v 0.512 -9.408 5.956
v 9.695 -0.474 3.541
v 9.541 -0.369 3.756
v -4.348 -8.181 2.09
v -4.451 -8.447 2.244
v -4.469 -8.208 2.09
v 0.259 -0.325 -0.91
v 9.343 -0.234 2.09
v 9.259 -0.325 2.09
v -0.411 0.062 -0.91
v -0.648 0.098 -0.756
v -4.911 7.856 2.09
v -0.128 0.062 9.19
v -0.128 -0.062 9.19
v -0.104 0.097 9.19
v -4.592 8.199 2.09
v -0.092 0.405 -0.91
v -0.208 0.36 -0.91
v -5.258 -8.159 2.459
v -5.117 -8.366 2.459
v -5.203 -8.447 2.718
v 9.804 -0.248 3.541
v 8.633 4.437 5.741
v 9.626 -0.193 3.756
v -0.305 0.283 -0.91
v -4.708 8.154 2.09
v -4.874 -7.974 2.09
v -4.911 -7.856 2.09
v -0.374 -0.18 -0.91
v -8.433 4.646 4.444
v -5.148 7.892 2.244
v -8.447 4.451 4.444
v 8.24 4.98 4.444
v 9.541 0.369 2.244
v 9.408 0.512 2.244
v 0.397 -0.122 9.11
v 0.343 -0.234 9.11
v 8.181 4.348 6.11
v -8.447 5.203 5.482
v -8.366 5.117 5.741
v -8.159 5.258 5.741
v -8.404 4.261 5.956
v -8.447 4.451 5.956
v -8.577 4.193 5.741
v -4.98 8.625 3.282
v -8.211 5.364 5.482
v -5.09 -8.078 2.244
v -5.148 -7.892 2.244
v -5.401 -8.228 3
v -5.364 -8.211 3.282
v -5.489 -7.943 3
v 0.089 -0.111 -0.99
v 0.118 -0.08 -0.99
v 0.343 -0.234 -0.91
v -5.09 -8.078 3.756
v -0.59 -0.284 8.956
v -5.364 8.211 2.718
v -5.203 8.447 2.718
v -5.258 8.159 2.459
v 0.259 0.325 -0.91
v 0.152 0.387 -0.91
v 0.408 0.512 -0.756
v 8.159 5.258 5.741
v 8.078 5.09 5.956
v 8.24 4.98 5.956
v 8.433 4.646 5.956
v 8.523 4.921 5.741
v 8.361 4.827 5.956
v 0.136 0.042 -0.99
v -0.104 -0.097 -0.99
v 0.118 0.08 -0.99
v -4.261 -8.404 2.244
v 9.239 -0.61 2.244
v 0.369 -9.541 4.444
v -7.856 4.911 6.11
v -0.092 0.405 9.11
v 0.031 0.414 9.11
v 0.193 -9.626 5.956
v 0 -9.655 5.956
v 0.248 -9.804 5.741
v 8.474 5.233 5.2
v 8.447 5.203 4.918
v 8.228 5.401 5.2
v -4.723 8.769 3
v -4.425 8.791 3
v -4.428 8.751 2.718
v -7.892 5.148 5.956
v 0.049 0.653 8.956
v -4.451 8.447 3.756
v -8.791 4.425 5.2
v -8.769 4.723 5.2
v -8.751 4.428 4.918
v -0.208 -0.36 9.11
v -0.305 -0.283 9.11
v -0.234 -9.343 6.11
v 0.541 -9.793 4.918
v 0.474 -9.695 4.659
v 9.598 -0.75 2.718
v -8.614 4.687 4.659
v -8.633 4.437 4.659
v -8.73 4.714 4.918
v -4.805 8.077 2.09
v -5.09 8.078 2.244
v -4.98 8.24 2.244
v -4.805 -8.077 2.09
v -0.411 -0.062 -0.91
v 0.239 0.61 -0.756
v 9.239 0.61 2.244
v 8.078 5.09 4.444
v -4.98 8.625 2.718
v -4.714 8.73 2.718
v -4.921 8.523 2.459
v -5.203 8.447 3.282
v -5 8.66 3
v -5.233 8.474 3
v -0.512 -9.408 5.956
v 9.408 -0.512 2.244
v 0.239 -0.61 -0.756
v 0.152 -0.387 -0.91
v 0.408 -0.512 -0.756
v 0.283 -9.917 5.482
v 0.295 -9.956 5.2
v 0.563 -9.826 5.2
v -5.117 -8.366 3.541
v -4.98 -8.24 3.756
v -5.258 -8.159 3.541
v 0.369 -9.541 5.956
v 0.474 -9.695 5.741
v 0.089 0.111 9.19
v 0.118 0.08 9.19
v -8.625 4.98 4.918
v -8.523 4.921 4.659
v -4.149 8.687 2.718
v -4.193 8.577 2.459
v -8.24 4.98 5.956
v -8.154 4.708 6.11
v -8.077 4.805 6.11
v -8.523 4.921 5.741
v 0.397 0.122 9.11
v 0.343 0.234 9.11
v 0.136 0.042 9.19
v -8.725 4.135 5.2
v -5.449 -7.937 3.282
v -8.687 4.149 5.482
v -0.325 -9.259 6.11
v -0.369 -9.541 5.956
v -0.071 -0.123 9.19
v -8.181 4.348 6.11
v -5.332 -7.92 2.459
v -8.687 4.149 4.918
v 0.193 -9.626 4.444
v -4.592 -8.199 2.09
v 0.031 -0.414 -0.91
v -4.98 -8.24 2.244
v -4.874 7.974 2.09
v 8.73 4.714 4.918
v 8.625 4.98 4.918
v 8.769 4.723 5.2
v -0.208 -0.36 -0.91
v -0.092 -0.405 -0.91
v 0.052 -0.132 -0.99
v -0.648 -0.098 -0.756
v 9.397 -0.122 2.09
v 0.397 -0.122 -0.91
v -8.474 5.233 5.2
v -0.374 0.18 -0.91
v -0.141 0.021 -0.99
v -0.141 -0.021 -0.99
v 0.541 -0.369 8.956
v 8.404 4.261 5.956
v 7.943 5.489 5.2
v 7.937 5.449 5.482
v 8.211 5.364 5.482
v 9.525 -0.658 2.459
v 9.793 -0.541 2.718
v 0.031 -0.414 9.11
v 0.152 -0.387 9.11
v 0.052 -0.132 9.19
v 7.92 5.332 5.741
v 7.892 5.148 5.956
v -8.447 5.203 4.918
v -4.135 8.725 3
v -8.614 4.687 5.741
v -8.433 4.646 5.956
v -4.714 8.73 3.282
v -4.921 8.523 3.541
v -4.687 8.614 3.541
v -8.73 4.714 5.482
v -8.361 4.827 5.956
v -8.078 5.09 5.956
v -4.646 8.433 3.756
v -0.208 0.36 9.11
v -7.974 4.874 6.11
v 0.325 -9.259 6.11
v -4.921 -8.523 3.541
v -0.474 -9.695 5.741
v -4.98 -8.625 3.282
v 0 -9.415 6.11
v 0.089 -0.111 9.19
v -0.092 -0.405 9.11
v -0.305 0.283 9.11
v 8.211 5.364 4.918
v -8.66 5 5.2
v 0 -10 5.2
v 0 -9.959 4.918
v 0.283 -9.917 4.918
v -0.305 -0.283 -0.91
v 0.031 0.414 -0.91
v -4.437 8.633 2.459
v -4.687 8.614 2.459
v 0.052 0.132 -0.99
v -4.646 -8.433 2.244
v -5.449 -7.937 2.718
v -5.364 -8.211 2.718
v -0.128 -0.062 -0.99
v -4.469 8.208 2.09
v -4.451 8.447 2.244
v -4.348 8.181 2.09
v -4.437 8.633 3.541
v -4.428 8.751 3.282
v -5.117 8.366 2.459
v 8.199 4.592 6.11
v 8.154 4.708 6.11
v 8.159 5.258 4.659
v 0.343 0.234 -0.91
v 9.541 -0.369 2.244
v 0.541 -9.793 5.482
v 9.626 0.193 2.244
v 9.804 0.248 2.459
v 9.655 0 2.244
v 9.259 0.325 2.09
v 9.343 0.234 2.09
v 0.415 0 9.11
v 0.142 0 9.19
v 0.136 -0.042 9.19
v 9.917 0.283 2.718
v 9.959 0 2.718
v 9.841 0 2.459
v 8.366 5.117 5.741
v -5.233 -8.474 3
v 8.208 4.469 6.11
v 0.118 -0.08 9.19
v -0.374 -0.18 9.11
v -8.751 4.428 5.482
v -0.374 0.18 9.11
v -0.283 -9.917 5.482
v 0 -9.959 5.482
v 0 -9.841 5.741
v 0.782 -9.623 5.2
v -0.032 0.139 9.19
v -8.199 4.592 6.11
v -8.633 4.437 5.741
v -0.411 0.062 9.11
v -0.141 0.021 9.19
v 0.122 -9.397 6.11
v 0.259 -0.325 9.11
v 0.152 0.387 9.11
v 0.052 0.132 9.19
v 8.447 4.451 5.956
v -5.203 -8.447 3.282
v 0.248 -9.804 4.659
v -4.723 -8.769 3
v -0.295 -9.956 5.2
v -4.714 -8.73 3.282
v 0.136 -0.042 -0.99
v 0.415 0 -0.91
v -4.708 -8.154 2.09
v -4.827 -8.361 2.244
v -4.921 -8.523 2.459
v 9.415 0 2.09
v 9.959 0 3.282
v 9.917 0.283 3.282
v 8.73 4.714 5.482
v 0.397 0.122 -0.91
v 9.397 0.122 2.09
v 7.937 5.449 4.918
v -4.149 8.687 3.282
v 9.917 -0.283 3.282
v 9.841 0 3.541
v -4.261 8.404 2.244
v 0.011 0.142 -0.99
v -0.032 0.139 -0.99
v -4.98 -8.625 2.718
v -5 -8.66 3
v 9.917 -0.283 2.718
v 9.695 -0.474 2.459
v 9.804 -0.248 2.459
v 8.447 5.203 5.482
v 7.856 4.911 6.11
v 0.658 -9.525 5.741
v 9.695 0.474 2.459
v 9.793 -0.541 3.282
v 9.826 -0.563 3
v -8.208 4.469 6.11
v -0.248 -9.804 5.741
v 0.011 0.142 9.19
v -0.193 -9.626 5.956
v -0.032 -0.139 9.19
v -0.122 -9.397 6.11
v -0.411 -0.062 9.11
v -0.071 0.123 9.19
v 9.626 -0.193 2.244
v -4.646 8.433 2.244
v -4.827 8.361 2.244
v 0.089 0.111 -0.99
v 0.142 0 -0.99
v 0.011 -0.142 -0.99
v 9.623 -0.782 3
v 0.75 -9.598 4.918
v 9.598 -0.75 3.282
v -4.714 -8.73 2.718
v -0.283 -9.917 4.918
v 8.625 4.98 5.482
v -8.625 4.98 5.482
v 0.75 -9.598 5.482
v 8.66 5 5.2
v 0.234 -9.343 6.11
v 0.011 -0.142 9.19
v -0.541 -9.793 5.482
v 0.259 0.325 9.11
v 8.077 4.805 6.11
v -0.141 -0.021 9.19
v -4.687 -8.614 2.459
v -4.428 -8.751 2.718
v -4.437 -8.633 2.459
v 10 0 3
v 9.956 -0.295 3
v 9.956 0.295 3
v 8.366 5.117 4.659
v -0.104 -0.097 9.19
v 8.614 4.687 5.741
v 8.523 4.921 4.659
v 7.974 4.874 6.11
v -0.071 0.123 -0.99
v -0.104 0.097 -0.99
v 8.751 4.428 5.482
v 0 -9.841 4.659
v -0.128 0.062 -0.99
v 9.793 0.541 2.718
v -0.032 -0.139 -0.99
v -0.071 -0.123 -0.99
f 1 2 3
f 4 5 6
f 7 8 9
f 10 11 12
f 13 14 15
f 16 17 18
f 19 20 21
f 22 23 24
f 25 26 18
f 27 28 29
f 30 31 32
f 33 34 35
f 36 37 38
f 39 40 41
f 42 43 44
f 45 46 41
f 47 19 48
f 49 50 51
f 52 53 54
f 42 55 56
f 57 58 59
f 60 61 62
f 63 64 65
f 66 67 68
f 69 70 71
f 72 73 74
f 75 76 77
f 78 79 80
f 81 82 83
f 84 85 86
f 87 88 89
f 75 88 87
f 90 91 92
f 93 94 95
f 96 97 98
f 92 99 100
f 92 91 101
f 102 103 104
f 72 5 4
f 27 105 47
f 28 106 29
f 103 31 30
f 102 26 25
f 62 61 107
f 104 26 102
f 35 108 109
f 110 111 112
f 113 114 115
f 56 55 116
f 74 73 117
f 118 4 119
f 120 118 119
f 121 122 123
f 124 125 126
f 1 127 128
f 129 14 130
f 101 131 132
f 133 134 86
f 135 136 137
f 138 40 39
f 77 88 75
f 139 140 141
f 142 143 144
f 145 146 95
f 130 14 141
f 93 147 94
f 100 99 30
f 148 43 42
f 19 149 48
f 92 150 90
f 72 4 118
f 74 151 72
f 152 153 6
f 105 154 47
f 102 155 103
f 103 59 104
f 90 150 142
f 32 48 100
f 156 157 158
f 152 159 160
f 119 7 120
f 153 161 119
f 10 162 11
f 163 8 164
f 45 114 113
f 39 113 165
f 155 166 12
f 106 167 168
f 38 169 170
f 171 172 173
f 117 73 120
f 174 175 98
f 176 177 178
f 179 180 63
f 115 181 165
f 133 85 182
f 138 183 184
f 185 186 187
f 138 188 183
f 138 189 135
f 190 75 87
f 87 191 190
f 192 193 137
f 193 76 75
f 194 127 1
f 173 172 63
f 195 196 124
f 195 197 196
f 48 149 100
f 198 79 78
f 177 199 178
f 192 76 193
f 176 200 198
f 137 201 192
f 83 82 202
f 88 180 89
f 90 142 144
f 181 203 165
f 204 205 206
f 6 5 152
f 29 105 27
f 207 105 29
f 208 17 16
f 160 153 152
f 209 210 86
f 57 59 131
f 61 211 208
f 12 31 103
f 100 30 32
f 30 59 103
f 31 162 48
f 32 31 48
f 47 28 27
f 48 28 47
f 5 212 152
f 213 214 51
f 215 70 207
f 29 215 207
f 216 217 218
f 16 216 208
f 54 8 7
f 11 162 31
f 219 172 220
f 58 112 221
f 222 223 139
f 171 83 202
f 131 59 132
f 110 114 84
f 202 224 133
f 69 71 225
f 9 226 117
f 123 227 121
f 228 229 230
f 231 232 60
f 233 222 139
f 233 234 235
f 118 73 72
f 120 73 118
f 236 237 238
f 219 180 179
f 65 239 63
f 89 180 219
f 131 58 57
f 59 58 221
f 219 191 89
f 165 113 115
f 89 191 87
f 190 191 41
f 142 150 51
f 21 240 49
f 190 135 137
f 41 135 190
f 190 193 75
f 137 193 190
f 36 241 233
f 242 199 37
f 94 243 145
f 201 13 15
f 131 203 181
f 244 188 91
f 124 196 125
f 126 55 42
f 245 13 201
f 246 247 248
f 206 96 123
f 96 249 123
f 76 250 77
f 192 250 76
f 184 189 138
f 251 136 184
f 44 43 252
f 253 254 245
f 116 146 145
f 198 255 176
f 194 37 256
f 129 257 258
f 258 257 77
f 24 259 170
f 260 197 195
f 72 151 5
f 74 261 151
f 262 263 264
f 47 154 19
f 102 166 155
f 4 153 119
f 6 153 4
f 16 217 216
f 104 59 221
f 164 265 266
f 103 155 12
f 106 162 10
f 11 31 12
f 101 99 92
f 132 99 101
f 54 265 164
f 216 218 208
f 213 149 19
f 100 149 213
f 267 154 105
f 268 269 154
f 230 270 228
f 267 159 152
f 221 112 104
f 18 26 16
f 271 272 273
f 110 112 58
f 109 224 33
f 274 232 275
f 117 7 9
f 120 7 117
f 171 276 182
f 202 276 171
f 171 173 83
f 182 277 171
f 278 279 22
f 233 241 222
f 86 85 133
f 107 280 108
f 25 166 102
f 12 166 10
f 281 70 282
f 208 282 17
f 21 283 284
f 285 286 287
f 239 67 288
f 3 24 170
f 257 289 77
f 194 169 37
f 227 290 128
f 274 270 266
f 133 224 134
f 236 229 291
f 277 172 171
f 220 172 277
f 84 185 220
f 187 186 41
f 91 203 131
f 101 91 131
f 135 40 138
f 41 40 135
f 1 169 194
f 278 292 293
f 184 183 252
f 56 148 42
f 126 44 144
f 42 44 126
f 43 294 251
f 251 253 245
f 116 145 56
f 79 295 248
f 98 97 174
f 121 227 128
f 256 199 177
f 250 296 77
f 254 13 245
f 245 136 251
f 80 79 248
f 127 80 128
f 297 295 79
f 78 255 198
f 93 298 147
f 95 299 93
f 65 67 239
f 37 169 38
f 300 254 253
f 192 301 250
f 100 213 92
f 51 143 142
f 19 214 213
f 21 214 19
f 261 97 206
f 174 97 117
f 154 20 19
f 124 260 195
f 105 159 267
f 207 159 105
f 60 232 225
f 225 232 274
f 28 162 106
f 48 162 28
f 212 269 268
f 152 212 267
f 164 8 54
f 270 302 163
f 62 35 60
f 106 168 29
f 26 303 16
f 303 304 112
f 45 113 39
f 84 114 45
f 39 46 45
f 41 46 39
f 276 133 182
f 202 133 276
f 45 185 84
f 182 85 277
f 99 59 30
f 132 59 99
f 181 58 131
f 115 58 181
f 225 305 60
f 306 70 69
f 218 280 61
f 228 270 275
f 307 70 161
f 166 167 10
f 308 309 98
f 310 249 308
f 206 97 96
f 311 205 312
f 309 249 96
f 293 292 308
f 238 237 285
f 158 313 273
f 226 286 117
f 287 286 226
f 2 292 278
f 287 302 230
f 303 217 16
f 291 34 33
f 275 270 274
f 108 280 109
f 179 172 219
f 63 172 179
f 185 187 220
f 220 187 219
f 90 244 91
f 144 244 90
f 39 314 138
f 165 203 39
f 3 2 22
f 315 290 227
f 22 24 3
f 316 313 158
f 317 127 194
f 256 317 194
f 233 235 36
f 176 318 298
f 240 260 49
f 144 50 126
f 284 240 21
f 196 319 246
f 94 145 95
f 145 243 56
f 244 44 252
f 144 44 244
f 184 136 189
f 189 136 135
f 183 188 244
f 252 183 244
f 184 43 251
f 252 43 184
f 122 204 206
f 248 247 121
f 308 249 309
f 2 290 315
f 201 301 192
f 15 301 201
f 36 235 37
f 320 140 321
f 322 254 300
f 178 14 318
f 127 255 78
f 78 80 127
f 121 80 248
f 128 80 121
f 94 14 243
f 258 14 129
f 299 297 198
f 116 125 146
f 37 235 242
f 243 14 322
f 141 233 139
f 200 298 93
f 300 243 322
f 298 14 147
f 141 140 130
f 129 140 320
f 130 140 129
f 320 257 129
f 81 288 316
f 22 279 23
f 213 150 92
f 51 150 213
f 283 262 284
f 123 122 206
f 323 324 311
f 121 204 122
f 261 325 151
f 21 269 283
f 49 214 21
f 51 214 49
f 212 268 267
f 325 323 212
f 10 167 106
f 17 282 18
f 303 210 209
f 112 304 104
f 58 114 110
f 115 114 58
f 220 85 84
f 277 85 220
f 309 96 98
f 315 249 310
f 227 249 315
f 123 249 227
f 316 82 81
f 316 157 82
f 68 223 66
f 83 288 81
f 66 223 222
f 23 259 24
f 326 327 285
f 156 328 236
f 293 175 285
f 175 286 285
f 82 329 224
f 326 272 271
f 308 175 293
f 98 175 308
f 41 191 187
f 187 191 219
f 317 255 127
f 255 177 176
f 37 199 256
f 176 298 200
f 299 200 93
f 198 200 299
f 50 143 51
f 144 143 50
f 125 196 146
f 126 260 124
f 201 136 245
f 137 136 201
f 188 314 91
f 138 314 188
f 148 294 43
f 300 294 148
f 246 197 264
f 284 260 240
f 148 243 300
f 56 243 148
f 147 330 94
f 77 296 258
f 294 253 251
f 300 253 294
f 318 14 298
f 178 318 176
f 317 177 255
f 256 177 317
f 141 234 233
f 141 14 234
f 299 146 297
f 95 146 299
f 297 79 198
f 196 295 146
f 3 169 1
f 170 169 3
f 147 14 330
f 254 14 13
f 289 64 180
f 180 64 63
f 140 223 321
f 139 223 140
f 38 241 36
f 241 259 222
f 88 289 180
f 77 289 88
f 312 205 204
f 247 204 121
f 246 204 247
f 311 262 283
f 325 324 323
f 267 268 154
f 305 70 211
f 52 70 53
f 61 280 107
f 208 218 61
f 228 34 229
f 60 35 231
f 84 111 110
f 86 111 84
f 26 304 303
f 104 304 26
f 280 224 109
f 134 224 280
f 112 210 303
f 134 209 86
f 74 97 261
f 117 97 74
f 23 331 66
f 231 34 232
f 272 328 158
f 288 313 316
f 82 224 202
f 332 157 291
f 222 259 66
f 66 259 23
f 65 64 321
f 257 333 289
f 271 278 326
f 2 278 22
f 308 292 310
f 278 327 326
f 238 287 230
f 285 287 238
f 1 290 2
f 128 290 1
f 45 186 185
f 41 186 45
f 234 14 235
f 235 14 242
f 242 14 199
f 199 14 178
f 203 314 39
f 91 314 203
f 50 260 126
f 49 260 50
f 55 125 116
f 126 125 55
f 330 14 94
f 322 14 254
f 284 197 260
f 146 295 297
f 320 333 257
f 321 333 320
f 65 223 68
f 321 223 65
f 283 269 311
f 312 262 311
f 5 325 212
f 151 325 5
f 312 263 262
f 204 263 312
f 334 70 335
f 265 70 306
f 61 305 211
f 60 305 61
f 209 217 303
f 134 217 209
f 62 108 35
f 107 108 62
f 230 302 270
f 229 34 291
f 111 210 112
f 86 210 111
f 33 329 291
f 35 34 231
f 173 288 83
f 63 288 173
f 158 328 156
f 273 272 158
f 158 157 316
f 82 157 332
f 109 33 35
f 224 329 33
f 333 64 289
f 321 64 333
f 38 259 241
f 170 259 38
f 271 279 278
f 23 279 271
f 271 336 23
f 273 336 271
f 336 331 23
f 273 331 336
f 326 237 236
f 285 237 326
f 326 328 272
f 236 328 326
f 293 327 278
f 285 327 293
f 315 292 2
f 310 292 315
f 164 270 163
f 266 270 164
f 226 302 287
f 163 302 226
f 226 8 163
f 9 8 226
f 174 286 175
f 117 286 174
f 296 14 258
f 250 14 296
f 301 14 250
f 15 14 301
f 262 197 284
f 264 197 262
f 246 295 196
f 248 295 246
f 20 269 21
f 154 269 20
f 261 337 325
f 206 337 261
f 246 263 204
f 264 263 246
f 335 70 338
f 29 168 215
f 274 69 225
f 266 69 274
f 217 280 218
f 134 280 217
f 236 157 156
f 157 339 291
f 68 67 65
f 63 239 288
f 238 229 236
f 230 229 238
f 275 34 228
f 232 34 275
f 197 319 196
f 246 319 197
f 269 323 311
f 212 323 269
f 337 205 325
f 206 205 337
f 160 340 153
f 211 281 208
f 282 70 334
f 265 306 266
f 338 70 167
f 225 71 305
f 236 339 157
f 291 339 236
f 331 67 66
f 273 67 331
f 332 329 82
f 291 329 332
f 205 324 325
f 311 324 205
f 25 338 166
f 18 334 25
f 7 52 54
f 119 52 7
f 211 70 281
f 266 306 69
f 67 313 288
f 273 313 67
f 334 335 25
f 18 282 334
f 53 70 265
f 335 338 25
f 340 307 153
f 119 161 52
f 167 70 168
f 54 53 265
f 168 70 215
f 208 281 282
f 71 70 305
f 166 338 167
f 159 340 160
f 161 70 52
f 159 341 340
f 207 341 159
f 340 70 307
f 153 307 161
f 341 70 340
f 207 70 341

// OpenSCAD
// Generated by SolidPython 0.4.6 on 2020-02-11 16:42:19
$fa = .01;
$fs = 0.3;


hull() {
	union() {
		translate(v = [0, 0, 0]) {
			sphere();
		}
		translate(v = [0, 0, 8.2000000000]) {
			sphere();
		}
		rotate(a = 0.0000000000, v = [0, 0, 1]) {
			translate(v = [9, 0, 3]) {
				sphere();
			}
		}
		rotate(a = 30.0000000000, v = [0, 0, 1]) {
			translate(v = [9, 0, 5.2000000000]) {
				sphere();
			}
		}
		rotate(a = 120.0000000000, v = [0, 0, 1]) {
			translate(v = [9, 0, 3]) {
				sphere();
			}
		}
		rotate(a = 150.0000000000, v = [0, 0, 1]) {
			translate(v = [9, 0, 5.2000000000]) {
				sphere();
			}
		}
		rotate(a = 240.0000000000, v = [0, 0, 1]) {
			translate(v = [9, 0, 3]) {
				sphere();
			}
		}
		rotate(a = 270.0000000000, v = [0, 0, 1]) {
			translate(v = [9, 0, 5.2000000000]) {
				sphere();
			}
		}
	}
}
/***********************************************
*********      SolidPython code:      **********
************************************************
 
from typing import Iterable
from os.path import join as path_join

from solid import *
from solid.utils import *


def line(
    a: Tuple[float, float, float],
    b: Tuple[float, float, float],
    r: float = 1.0,
    capped=True,
):
    if capped:
        return hull()(translate(a)(sphere(r=r)), translate(b)(sphere(r=r)))
    else:
        return hull()(
            hull()(translate(a)(sphere(r=r)), translate(b)(sphere(r=r)))
            - translate(a)(sphere(r=r))
            - translate(b)(sphere(r=r))
        )


def mix(p1: Tuple[float, float, float], p2: Tuple[float, float, float], a: float):
    if len(p1) != len(p2):
        raise IndexError()
    return tuple((x * (1 - a)) + (y * a) for x, y in zip(p1, p2))


def pairwise_hull(objs: Iterable[OpenSCADObject]):
    return sum(hull()(a, b) for a, b in zip(objs, objs[1:]))


def generate_part(part, partname, resolution=0.1):
    scad_render_to_file(
        part,
        path_join("generated", f"{partname}.scad"),
        file_header=f"$fa = .01;\n$fs = {resolution};\n",
    )


__all__ = ["line", "mix", "pairwise_hull", "generate_part"]
 
 
************************************************/
